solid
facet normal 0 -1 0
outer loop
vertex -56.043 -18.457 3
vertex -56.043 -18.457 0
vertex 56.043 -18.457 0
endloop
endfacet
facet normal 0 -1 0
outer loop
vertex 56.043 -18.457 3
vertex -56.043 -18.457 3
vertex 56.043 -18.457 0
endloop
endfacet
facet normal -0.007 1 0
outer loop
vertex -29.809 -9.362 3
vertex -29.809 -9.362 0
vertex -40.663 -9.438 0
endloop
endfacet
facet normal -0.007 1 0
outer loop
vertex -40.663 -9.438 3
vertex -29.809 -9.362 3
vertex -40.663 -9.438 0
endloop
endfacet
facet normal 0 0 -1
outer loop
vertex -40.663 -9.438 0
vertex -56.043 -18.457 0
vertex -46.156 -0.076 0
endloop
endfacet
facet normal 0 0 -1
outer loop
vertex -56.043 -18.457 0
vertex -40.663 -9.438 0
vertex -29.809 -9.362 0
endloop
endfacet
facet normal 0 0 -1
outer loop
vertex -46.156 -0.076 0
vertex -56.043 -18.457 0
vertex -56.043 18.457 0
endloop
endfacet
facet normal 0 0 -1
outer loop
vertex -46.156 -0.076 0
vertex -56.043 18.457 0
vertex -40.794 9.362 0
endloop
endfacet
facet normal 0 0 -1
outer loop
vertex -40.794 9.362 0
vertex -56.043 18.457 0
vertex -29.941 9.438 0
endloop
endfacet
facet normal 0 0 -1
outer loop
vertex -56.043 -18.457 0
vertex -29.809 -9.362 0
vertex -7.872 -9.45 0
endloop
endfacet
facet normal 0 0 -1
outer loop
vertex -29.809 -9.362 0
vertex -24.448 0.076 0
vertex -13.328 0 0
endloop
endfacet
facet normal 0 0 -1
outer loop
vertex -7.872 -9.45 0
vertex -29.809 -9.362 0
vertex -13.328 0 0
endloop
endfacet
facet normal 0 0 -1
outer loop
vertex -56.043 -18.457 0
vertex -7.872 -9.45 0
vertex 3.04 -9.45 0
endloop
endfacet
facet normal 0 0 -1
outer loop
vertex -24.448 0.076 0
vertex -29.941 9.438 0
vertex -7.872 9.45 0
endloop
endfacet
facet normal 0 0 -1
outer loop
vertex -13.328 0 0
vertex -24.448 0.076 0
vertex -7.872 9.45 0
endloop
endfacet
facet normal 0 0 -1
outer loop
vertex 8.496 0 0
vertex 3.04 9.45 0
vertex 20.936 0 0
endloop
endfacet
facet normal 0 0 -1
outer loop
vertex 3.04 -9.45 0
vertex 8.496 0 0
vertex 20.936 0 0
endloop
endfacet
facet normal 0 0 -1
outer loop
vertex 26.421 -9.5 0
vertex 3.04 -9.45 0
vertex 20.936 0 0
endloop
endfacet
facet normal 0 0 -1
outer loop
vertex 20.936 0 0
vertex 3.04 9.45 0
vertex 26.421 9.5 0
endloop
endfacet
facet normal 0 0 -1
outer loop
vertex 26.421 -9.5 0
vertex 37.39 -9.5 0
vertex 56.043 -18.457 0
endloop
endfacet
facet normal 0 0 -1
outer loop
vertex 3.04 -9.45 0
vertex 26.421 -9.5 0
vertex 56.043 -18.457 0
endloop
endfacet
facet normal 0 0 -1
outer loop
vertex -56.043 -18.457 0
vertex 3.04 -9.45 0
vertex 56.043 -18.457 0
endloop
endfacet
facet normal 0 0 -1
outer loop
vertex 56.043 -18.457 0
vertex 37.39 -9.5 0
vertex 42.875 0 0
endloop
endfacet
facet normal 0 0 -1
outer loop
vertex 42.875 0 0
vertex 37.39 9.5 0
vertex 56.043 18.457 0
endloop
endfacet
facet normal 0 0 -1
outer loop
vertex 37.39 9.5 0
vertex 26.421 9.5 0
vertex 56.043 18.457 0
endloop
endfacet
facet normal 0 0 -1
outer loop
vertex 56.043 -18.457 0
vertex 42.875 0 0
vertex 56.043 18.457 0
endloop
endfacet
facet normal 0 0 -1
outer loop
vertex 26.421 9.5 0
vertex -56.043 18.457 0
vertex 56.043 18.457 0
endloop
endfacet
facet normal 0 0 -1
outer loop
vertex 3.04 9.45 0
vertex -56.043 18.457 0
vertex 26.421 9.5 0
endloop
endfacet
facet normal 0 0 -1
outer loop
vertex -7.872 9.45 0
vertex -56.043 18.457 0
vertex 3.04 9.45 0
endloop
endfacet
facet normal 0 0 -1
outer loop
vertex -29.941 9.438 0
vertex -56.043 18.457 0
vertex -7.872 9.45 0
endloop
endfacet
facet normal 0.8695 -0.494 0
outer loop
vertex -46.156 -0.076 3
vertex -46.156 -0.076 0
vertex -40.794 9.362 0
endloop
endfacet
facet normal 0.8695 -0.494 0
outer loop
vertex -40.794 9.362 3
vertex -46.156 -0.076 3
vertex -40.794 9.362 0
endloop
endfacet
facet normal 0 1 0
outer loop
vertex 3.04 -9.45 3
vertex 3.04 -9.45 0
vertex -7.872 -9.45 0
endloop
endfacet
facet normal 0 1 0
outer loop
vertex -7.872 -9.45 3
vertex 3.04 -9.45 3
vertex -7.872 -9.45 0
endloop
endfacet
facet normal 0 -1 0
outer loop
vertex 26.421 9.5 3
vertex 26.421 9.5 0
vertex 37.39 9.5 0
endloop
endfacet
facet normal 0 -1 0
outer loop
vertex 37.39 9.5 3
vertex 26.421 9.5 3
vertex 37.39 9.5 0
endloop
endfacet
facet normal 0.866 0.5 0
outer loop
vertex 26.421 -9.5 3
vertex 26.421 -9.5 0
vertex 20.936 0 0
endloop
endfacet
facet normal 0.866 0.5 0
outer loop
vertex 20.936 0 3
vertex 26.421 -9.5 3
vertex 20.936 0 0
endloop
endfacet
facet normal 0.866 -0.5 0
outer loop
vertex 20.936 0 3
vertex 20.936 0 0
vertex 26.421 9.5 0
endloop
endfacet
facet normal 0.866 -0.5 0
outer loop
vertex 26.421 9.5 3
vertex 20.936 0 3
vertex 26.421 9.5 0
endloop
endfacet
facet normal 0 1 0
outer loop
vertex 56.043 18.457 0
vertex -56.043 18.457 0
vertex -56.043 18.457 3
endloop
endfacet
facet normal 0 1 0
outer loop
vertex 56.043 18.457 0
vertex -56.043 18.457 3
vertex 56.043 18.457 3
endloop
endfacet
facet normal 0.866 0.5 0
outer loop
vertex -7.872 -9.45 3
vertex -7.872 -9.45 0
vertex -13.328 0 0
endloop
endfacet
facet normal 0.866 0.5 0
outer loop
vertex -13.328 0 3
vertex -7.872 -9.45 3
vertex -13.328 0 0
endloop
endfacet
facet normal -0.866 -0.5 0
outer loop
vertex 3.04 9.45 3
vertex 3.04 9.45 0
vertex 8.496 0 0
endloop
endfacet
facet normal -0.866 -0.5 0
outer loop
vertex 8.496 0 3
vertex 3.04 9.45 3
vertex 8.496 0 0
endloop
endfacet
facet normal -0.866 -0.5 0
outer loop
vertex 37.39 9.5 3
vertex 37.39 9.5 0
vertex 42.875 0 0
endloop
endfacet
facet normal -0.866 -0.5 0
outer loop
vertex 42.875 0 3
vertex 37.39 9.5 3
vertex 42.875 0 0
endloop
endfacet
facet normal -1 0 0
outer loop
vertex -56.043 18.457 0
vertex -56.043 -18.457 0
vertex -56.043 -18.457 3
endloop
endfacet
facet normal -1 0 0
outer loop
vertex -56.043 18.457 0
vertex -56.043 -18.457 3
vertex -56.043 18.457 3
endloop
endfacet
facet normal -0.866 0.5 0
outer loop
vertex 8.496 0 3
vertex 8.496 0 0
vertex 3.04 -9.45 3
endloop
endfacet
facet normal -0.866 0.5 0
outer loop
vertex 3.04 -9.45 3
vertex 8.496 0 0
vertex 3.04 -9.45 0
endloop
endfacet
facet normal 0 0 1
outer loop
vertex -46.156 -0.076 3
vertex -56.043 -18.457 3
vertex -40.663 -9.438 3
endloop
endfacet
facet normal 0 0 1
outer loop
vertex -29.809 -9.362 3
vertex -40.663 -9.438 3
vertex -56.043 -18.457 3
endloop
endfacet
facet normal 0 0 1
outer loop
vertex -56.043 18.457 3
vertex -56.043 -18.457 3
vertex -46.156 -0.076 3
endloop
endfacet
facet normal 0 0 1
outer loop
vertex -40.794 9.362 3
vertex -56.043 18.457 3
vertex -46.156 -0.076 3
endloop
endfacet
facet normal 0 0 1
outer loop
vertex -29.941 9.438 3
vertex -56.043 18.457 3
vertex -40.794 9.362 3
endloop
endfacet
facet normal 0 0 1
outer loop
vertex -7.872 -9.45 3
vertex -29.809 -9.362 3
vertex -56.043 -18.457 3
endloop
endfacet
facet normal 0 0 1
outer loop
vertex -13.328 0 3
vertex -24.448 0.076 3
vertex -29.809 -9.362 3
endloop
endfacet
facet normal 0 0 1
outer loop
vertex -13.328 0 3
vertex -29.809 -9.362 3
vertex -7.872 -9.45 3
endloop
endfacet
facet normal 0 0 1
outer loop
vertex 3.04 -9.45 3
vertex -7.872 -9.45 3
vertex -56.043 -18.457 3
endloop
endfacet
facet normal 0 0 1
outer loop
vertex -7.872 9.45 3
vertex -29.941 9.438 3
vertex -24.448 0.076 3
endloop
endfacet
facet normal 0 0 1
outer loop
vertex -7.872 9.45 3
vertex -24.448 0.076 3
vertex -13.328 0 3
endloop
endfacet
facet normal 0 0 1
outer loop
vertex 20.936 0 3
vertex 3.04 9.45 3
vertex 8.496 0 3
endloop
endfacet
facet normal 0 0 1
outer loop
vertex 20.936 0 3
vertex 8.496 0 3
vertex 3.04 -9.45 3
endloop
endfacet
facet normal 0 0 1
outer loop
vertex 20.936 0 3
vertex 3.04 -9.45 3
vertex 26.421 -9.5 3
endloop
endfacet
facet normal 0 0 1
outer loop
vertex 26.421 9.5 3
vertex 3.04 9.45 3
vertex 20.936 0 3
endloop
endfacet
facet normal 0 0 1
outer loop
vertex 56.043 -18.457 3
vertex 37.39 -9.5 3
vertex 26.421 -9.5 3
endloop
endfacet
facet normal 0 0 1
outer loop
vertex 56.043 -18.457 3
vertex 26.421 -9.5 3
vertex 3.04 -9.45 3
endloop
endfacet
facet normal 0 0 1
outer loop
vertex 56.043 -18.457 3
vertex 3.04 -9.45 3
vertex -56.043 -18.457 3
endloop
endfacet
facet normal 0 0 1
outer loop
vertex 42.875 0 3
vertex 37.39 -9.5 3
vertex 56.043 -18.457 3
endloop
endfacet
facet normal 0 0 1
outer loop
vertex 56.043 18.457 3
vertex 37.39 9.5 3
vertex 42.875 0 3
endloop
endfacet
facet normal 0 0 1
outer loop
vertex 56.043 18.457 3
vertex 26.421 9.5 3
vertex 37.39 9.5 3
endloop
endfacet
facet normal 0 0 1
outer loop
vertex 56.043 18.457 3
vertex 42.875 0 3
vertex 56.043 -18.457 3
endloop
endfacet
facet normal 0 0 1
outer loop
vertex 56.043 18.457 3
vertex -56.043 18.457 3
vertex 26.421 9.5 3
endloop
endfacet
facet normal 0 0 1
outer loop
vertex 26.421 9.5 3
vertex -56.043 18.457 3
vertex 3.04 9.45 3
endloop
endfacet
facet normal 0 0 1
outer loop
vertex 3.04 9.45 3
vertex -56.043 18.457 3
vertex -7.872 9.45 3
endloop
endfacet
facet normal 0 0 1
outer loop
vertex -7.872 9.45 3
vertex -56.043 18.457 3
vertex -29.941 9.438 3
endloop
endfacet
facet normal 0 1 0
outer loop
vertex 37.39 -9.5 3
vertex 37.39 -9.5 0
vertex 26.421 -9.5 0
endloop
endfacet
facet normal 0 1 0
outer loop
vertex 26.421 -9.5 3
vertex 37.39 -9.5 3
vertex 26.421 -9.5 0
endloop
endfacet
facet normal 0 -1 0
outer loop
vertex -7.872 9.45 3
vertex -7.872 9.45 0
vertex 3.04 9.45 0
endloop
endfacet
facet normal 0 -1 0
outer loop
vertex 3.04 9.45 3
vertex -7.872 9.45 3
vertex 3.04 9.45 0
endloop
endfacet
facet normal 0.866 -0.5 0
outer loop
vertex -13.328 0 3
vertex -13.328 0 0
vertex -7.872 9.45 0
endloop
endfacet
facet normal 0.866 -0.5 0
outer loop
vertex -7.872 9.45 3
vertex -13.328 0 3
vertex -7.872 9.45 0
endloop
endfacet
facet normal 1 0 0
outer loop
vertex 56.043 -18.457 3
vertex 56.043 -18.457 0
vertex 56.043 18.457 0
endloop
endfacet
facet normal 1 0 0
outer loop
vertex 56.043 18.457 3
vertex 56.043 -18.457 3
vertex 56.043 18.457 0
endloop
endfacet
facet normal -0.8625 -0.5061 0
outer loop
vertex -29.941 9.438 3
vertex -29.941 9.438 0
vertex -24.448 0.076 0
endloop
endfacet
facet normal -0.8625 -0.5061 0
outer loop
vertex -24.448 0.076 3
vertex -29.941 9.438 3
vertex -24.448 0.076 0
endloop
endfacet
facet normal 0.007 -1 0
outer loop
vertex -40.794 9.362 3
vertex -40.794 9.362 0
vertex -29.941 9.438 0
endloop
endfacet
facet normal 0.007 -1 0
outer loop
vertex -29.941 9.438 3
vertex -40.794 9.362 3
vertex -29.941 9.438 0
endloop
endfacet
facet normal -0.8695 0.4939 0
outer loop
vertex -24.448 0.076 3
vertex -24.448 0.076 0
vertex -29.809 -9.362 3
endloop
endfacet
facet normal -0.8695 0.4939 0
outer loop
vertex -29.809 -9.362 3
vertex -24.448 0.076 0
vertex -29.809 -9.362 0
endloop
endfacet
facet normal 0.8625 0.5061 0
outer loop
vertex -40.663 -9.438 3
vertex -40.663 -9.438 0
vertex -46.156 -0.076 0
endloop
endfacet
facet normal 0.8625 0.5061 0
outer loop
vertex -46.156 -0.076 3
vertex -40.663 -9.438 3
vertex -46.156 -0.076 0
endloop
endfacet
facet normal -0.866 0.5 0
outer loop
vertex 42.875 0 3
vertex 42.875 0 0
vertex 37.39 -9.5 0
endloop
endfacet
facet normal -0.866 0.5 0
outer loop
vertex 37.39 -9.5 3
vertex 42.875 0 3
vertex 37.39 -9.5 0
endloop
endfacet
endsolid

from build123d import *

# Parameters (mm, degrees)
F0_W     = 112.086874
F0_H     = 36.914836
F1_DEPTH = 3


with BuildPart() as f1:
    # F0 (on Top) → F1 (new body)
    with BuildSketch(Plane.XY):
        Rectangle(F0_W, F0_H)
        Polygon((-40.794464, 9.361871), (-29.940543, 9.437671), (-24.447938, 0.0758), (-29.809254, -9.361871), (-40.663174, -9.437671), (-46.155779, -0.0758), align=None, mode=Mode.SUBTRACT)
        Polygon((8.495988, 0), (3.040028, -9.45), (-7.871892, -9.45), (-13.327852, 0), (-7.871892, 9.45), (3.040028, 9.45), align=None, mode=Mode.SUBTRACT)
        Polygon((42.875068, 0), (37.39024, -9.5), (26.420585, -9.5), (20.935758, 0), (26.420585, 9.5), (37.39024, 9.5), align=None, mode=Mode.SUBTRACT)
    extrude(amount=F1_DEPTH)


solid = f1.part
